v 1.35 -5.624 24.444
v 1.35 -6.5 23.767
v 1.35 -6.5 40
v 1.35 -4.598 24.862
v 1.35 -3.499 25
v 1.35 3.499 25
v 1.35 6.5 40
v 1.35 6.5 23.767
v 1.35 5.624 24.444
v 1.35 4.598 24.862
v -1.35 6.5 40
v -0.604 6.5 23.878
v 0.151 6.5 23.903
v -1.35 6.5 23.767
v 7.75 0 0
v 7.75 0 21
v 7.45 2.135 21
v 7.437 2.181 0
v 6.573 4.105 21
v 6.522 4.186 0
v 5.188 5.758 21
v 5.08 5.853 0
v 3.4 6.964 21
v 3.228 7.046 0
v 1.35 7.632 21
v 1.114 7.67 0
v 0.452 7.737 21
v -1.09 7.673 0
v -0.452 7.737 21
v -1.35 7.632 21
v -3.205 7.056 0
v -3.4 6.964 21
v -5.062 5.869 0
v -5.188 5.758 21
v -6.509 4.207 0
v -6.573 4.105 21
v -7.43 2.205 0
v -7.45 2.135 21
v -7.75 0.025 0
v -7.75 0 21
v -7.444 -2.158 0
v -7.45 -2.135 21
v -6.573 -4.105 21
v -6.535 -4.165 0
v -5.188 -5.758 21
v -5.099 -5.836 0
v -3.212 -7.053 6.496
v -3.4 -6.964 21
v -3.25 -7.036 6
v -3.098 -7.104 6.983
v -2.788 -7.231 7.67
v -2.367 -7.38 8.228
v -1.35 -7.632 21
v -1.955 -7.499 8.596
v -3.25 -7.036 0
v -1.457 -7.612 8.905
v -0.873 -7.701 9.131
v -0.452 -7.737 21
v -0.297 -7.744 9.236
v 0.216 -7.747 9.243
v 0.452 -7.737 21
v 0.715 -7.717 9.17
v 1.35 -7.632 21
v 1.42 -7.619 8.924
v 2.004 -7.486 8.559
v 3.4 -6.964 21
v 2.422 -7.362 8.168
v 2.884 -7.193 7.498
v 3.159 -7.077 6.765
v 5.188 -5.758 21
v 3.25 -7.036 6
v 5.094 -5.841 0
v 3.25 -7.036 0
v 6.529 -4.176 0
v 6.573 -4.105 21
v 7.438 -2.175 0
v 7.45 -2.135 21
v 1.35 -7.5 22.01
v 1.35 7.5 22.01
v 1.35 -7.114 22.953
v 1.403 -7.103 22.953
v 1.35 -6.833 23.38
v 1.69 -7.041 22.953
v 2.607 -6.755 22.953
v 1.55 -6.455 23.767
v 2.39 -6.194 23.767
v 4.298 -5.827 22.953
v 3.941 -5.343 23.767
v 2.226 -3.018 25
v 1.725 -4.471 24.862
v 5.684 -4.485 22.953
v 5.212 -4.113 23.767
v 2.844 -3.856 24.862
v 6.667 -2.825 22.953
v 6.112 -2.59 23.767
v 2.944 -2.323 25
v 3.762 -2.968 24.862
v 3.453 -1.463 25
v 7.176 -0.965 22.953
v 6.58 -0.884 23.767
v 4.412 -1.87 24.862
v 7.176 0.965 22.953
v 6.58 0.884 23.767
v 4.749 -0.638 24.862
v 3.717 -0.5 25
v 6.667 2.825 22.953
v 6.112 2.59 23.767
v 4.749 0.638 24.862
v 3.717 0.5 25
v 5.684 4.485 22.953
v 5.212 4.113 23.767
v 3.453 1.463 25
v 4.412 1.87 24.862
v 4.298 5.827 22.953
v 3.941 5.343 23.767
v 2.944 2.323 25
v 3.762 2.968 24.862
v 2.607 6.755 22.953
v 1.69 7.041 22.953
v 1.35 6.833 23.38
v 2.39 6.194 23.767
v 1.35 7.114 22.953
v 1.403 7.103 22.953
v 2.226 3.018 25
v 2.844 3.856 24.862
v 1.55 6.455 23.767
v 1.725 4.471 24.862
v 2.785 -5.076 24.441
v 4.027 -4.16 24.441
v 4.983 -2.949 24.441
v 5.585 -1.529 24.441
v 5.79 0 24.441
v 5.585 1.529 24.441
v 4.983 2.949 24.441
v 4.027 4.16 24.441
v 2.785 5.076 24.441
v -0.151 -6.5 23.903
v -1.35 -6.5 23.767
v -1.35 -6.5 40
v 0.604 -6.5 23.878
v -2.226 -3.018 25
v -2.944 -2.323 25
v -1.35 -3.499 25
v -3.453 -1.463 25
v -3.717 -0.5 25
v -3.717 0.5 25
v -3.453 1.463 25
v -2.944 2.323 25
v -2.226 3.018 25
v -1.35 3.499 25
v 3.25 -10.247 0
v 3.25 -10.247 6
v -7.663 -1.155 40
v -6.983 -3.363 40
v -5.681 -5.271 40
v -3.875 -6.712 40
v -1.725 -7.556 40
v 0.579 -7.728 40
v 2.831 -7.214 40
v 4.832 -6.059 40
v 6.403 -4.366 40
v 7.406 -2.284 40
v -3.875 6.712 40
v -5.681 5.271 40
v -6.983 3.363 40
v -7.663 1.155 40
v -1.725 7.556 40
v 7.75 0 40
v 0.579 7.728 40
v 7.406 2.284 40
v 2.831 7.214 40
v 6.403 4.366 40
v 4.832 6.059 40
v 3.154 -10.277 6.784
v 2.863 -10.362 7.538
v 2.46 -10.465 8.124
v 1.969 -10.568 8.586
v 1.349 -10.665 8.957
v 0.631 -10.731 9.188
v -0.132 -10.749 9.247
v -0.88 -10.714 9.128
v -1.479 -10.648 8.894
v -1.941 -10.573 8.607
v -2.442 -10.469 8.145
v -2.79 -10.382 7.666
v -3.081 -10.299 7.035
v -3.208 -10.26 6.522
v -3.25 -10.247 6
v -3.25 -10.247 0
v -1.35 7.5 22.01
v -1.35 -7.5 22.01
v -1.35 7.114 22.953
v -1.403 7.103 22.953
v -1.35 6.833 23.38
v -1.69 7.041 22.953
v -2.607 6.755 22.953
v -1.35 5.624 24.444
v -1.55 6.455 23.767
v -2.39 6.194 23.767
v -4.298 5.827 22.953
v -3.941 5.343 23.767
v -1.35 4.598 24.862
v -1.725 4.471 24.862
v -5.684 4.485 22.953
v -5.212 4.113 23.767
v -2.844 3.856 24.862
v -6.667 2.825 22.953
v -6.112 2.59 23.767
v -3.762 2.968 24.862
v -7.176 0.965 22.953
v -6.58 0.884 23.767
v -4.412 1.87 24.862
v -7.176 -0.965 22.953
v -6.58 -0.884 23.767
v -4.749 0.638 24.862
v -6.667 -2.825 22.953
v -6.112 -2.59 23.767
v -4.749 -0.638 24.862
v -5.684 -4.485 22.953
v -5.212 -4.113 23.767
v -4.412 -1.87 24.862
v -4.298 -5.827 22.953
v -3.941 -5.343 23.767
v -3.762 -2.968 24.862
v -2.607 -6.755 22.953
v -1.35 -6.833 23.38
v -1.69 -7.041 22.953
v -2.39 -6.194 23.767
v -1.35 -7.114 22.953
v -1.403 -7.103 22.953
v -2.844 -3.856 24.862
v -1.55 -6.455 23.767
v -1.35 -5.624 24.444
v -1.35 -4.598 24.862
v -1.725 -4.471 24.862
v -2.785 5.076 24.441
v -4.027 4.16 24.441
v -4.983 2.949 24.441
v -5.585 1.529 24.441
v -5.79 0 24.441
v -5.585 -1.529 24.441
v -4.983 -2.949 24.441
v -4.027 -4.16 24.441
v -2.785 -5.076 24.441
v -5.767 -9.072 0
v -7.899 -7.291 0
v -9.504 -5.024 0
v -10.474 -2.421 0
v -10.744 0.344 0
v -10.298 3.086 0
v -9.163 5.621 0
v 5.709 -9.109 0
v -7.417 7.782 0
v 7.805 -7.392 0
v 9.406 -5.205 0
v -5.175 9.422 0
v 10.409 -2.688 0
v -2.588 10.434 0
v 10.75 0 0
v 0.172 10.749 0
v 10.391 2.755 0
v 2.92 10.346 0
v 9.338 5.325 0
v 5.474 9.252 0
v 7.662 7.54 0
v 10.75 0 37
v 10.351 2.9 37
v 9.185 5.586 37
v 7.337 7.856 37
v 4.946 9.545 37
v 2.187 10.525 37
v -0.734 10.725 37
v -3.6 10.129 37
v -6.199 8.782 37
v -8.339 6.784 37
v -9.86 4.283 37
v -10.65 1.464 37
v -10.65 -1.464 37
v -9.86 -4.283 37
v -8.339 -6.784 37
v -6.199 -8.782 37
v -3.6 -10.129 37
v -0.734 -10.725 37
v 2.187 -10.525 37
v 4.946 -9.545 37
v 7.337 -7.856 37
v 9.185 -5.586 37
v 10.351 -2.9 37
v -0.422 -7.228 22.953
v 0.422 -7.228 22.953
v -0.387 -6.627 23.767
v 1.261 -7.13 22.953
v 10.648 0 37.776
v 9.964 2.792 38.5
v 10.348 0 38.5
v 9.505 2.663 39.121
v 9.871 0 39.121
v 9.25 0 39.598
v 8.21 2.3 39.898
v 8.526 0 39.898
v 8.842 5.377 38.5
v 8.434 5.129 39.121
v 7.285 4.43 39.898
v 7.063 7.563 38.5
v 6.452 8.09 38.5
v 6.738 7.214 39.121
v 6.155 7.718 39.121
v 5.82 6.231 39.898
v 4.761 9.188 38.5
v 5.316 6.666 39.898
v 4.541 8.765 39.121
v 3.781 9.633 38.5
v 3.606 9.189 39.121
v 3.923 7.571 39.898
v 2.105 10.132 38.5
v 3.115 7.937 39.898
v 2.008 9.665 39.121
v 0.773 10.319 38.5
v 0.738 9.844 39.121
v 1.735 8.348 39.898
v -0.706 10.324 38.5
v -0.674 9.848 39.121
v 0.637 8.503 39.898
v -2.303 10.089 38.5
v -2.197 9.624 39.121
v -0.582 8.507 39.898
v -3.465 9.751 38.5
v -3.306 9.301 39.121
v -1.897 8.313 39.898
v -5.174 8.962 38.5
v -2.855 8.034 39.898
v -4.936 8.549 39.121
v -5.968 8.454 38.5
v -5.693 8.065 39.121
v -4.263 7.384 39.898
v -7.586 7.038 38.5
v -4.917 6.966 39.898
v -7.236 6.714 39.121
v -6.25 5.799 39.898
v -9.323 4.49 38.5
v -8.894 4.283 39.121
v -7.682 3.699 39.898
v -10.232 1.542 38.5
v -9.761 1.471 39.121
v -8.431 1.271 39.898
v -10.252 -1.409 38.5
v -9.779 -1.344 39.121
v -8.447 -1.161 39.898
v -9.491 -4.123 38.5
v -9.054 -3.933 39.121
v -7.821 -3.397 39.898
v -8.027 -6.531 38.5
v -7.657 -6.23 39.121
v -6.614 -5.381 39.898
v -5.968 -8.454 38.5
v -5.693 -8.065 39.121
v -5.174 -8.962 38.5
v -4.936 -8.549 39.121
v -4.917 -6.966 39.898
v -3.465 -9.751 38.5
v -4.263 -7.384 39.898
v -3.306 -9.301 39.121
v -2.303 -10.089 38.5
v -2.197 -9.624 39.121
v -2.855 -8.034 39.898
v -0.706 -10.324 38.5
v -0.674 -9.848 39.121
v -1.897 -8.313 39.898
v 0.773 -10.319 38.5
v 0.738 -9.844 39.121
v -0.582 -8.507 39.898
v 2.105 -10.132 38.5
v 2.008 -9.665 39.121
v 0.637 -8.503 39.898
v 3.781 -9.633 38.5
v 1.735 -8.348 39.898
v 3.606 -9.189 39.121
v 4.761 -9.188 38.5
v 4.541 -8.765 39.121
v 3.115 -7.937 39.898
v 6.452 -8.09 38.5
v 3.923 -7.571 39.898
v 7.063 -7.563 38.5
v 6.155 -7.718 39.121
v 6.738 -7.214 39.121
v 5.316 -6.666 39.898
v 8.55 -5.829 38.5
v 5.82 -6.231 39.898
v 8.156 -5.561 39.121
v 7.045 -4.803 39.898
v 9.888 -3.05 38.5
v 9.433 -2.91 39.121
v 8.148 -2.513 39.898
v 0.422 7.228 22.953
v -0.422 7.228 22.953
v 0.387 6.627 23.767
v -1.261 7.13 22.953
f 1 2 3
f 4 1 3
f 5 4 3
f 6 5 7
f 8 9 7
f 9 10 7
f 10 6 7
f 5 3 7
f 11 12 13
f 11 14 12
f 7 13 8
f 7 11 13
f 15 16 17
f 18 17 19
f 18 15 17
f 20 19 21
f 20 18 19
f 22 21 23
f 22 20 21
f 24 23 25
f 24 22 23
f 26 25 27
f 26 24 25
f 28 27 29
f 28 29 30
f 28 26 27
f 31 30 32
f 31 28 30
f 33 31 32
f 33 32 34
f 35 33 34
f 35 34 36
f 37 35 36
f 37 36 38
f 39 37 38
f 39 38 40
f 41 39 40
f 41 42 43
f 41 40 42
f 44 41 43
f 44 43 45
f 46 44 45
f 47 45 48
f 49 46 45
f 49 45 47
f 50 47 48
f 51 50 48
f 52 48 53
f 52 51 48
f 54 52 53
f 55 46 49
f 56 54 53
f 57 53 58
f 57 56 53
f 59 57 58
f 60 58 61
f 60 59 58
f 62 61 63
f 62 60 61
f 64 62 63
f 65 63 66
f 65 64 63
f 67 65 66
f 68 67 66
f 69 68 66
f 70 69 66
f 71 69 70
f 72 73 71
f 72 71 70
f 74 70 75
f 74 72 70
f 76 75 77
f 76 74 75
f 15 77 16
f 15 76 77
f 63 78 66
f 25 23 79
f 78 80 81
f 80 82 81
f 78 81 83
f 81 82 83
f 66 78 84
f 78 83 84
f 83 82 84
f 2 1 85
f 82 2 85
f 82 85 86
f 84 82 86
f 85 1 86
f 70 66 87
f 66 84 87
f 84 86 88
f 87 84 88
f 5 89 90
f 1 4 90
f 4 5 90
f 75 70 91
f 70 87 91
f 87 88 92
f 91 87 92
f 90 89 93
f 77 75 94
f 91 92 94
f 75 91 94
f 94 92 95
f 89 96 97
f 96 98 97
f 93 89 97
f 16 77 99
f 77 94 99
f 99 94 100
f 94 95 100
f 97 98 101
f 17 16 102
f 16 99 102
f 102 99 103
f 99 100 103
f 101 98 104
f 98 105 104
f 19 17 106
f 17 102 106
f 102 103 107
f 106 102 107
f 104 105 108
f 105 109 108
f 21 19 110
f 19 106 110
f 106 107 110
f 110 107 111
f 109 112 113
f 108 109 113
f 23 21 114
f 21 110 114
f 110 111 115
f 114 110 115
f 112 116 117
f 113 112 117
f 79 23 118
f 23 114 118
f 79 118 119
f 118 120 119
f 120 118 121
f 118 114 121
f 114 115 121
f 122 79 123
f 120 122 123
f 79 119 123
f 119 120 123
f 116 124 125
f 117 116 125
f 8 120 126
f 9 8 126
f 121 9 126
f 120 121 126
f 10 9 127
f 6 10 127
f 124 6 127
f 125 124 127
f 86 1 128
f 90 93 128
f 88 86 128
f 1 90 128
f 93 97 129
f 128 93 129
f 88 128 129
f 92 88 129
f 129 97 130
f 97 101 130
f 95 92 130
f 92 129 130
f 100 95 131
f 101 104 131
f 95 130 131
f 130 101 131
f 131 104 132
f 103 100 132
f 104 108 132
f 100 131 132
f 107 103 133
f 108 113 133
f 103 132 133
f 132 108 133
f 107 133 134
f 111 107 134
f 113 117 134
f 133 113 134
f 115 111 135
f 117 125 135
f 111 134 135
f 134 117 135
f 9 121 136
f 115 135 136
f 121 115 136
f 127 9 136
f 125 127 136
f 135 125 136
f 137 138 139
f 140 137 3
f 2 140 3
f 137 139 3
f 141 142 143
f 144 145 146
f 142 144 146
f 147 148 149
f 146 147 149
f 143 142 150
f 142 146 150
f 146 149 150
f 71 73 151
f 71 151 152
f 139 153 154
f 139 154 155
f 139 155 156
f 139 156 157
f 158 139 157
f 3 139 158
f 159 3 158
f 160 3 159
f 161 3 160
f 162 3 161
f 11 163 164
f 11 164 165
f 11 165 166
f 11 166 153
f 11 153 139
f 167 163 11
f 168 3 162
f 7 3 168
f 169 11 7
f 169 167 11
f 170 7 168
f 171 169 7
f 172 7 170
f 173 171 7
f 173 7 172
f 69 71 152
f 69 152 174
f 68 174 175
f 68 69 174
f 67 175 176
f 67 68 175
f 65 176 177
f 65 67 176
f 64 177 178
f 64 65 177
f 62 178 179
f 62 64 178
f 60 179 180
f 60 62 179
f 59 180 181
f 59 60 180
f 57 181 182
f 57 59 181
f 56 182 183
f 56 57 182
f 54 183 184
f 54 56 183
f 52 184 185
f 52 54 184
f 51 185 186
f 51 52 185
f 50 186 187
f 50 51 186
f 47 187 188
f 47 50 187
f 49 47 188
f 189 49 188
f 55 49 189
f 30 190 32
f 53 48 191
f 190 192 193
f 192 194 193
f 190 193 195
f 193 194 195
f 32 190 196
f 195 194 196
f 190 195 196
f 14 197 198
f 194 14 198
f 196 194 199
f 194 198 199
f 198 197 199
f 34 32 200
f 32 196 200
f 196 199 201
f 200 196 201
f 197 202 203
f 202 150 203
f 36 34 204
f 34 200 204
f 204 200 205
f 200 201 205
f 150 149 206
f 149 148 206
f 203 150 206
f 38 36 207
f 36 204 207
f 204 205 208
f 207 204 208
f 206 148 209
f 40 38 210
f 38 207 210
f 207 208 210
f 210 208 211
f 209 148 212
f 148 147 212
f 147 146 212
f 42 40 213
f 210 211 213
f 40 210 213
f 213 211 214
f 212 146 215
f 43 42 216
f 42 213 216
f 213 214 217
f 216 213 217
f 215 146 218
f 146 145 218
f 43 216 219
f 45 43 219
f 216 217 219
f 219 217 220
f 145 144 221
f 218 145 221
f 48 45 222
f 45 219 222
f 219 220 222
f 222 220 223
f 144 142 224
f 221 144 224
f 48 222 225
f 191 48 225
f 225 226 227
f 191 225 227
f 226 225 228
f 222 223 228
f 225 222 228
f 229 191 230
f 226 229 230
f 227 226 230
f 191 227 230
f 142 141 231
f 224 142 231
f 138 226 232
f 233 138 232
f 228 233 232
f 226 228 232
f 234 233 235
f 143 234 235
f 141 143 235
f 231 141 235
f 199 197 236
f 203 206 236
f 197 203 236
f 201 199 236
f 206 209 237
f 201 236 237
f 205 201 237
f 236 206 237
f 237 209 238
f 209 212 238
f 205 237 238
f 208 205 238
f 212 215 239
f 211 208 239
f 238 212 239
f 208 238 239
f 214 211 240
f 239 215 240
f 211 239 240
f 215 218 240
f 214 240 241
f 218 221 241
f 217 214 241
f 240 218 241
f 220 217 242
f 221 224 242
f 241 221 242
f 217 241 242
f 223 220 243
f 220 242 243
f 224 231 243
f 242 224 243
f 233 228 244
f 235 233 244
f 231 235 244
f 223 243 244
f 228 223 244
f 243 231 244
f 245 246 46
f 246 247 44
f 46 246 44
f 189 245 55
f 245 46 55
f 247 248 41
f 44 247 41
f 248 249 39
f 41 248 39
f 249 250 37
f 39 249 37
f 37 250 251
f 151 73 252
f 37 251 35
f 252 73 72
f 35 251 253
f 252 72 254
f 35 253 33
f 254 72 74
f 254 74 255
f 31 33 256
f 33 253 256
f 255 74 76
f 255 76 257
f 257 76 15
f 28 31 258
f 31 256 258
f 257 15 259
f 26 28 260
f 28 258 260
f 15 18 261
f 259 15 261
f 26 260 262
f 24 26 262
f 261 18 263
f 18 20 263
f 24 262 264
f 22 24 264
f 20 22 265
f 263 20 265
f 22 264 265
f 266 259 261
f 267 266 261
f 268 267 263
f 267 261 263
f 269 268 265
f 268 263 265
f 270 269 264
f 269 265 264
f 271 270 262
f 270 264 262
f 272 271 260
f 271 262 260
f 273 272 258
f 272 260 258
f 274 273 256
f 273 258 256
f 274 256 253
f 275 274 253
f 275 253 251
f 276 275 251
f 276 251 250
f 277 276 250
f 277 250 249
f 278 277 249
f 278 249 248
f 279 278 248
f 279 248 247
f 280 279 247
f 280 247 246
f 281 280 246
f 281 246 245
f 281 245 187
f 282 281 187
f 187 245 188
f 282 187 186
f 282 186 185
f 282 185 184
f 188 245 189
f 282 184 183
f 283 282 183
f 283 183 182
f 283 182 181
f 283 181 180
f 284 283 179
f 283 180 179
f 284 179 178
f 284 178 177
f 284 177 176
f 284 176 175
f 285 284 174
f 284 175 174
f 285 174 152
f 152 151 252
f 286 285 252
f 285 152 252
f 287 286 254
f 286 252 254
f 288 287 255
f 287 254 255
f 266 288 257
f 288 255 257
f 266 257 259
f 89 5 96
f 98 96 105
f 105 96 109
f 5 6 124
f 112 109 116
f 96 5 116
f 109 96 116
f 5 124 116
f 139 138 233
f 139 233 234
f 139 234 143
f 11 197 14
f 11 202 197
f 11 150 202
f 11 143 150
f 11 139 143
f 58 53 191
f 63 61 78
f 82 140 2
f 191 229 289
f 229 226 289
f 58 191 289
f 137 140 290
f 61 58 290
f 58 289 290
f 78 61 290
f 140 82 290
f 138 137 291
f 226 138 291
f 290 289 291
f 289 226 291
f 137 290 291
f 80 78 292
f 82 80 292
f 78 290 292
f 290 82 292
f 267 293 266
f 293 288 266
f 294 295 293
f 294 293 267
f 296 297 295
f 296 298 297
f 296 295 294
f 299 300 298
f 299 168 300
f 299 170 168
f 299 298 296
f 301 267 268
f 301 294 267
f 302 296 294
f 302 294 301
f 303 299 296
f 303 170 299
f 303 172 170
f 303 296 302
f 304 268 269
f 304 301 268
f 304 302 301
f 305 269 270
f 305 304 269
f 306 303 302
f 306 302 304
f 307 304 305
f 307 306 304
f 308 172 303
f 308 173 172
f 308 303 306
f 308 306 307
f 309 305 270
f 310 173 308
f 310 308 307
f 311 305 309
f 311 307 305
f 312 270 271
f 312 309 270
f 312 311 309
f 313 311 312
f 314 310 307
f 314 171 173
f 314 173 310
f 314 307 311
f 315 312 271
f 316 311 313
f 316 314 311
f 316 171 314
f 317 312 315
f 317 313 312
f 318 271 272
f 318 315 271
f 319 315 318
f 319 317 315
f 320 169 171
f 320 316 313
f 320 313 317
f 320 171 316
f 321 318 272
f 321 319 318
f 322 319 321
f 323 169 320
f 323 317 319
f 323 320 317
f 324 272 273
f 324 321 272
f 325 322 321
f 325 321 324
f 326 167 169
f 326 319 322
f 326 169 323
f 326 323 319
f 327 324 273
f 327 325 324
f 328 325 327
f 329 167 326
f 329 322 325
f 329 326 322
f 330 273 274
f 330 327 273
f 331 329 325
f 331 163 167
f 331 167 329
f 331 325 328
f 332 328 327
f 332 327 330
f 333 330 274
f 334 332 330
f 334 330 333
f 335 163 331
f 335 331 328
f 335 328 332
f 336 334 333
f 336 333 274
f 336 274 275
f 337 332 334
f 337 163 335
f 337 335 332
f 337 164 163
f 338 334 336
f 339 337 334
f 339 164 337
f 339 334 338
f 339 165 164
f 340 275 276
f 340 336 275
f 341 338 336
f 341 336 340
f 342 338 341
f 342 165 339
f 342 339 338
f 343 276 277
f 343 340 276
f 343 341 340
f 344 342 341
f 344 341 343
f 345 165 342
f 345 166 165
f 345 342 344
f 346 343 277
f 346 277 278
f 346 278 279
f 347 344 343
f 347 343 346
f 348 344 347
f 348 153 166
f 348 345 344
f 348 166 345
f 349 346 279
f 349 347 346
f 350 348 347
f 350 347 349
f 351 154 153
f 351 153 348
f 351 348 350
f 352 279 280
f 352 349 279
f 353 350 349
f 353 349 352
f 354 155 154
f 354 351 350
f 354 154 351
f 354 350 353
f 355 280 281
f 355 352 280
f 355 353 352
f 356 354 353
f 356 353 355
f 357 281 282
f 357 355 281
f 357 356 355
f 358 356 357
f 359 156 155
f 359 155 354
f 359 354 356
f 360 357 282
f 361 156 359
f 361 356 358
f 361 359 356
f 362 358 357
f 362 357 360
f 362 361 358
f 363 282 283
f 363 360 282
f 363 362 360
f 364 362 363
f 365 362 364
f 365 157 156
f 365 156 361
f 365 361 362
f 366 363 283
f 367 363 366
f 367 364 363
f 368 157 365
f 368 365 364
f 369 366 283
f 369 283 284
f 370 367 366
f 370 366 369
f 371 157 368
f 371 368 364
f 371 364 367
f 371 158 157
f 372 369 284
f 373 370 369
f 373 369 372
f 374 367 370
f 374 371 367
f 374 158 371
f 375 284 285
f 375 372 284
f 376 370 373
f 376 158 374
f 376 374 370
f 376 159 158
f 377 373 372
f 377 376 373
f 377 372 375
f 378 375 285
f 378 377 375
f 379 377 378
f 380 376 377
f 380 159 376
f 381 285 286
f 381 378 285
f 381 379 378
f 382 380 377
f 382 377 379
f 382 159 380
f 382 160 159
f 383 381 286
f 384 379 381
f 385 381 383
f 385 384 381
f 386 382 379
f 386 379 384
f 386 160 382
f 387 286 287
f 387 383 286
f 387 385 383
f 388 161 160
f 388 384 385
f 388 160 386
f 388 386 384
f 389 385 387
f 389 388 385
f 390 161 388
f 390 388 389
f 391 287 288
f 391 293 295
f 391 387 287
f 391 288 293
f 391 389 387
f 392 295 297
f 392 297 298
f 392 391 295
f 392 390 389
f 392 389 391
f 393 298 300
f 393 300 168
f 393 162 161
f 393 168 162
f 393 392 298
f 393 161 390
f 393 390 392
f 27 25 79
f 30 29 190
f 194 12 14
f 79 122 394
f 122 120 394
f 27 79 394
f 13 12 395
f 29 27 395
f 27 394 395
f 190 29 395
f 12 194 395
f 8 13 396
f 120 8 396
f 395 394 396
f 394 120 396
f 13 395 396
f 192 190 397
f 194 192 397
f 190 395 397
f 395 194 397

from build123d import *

# Parameters (mm, degrees)
F0_R     = 10.75
F0_R_2   = 7.75
F1_DEPTH = 40
F3_DEPTH = 15
F4_DEPTH = 25
F7_R     = 3
F6_W     = 2.7
F6_H     = 13
F8_DEPTH = 25


# Not quite as in the source:
# - a fillet or chamfer that OpenCascade refuses, or shapes differently, is made with other operations: its cross-section is extruded or revolved along the edge and cut away or added


with BuildPart() as f1:
    # F0 (on Top) → F1 (new body)
    with BuildSketch(Plane.XY):
        Circle(F0_R)
        Circle(F0_R_2, mode=Mode.SUBTRACT)
        Circle(F0_R_2)
    extrude(amount=F1_DEPTH)

    # F2 (on Front) → F3 (cut)
    with BuildSketch(Plane.XZ):
        with BuildLine():
            Line((-3.25, 6), (-3.25, 0))
            Line((-3.25, 0), (3.25, 0))
            Line((3.25, 0), (3.25, 6))
            ThreePointArc((3.25, 6), (0, 9.25), (-3.25, 6))
        make_face()
    extrude(amount=F3_DEPTH, mode=Mode.SUBTRACT)

    # F0 (on Top) → F4 (cut)
    with BuildSketch(Plane.XY):
        Circle(F0_R_2)
    extrude(amount=F4_DEPTH, mode=Mode.SUBTRACT)

    # F7
    f7_edges = [f1.edges().sort_by_distance(p)[0] for p in [
        (-10.75, 0, 40),
    ]]
    fillet(f7_edges, radius=F7_R)

    # F6 (on offset) → F8 (cut)
    with BuildSketch(Plane.XY.offset(40)):
        Rectangle(F6_W, F6_H)
    extrude(amount=-F8_DEPTH, mode=Mode.SUBTRACT)

    # F9: fillet of radius 4 on 1 edges, made by hand


with BuildPart() as f9_tool2:
    # F9_s3 → F9_t4 (revolve)
    with BuildSketch(Plane.XZ):
        with BuildLine():
            ThreePointArc((7.75, 21), (6.5784271247, 23.8284271247), (3.75, 25))
            Line((3.75, 25), (7.75, 25))
            Line((7.75, 25), (7.75, 21))
        make_face()
    revolve(axis=Axis((0, 0, 25), (0, 0, 1)))

    split(bisect_by=Plane.YZ.offset(1.35), keep=Keep.TOP)


with BuildPart() as f1_1:
    add(f1.part)

    # F9_t1: union F9_tool2
    add(f9_tool2.part)


with BuildPart() as f9_tool7:
    # F9_s8 → F9_t9 (revolve)
    with BuildSketch(Plane.XZ):
        with BuildLine():
            ThreePointArc((7.75, 21), (6.5784271247, 23.8284271247), (3.75, 25))
            Line((3.75, 25), (7.75, 25))
            Line((7.75, 25), (7.75, 21))
        make_face()
    revolve(axis=Axis((0, 0, 25), (0, 0, 1)))

    split(bisect_by=Plane.YZ.offset(-1.35), keep=Keep.BOTTOM)


with BuildPart() as f1_2:
    add(f1_1.part)

    # F9_t6: union F9_tool7
    add(f9_tool7.part)


with BuildPart() as f9_tool12:
    # F9_s13 → F9_t14 (revolve)
    with BuildSketch(Plane.XZ):
        with BuildLine():
            ThreePointArc((7.75, 21), (6.5784271247, 23.8284271247), (3.75, 25))
            Line((3.75, 25), (7.75, 25))
            Line((7.75, 25), (7.75, 21))
        make_face()
    revolve(axis=Axis((0, 0, 25), (0, 0, 1)))

    split(bisect_by=Plane.XZ.offset(-6.5), keep=Keep.BOTTOM)


with BuildPart() as f1_3:
    add(f1_2.part)

    # F9_t11: union F9_tool12
    add(f9_tool12.part)


with BuildPart() as f9_tool17:
    # F9_s18 → F9_t19 (revolve)
    with BuildSketch(Plane.XZ):
        with BuildLine():
            ThreePointArc((7.75, 21), (6.5784271247, 23.8284271247), (3.75, 25))
            Line((3.75, 25), (7.75, 25))
            Line((7.75, 25), (7.75, 21))
        make_face()
    revolve(axis=Axis((0, 0, 25), (0, 0, 1)))

    split(bisect_by=Plane.XZ.offset(6.5), keep=Keep.TOP)


with BuildPart() as f1_4:
    add(f1_3.part)

    # F9_t16: union F9_tool17
    add(f9_tool17.part)


solid = f1_4.part
